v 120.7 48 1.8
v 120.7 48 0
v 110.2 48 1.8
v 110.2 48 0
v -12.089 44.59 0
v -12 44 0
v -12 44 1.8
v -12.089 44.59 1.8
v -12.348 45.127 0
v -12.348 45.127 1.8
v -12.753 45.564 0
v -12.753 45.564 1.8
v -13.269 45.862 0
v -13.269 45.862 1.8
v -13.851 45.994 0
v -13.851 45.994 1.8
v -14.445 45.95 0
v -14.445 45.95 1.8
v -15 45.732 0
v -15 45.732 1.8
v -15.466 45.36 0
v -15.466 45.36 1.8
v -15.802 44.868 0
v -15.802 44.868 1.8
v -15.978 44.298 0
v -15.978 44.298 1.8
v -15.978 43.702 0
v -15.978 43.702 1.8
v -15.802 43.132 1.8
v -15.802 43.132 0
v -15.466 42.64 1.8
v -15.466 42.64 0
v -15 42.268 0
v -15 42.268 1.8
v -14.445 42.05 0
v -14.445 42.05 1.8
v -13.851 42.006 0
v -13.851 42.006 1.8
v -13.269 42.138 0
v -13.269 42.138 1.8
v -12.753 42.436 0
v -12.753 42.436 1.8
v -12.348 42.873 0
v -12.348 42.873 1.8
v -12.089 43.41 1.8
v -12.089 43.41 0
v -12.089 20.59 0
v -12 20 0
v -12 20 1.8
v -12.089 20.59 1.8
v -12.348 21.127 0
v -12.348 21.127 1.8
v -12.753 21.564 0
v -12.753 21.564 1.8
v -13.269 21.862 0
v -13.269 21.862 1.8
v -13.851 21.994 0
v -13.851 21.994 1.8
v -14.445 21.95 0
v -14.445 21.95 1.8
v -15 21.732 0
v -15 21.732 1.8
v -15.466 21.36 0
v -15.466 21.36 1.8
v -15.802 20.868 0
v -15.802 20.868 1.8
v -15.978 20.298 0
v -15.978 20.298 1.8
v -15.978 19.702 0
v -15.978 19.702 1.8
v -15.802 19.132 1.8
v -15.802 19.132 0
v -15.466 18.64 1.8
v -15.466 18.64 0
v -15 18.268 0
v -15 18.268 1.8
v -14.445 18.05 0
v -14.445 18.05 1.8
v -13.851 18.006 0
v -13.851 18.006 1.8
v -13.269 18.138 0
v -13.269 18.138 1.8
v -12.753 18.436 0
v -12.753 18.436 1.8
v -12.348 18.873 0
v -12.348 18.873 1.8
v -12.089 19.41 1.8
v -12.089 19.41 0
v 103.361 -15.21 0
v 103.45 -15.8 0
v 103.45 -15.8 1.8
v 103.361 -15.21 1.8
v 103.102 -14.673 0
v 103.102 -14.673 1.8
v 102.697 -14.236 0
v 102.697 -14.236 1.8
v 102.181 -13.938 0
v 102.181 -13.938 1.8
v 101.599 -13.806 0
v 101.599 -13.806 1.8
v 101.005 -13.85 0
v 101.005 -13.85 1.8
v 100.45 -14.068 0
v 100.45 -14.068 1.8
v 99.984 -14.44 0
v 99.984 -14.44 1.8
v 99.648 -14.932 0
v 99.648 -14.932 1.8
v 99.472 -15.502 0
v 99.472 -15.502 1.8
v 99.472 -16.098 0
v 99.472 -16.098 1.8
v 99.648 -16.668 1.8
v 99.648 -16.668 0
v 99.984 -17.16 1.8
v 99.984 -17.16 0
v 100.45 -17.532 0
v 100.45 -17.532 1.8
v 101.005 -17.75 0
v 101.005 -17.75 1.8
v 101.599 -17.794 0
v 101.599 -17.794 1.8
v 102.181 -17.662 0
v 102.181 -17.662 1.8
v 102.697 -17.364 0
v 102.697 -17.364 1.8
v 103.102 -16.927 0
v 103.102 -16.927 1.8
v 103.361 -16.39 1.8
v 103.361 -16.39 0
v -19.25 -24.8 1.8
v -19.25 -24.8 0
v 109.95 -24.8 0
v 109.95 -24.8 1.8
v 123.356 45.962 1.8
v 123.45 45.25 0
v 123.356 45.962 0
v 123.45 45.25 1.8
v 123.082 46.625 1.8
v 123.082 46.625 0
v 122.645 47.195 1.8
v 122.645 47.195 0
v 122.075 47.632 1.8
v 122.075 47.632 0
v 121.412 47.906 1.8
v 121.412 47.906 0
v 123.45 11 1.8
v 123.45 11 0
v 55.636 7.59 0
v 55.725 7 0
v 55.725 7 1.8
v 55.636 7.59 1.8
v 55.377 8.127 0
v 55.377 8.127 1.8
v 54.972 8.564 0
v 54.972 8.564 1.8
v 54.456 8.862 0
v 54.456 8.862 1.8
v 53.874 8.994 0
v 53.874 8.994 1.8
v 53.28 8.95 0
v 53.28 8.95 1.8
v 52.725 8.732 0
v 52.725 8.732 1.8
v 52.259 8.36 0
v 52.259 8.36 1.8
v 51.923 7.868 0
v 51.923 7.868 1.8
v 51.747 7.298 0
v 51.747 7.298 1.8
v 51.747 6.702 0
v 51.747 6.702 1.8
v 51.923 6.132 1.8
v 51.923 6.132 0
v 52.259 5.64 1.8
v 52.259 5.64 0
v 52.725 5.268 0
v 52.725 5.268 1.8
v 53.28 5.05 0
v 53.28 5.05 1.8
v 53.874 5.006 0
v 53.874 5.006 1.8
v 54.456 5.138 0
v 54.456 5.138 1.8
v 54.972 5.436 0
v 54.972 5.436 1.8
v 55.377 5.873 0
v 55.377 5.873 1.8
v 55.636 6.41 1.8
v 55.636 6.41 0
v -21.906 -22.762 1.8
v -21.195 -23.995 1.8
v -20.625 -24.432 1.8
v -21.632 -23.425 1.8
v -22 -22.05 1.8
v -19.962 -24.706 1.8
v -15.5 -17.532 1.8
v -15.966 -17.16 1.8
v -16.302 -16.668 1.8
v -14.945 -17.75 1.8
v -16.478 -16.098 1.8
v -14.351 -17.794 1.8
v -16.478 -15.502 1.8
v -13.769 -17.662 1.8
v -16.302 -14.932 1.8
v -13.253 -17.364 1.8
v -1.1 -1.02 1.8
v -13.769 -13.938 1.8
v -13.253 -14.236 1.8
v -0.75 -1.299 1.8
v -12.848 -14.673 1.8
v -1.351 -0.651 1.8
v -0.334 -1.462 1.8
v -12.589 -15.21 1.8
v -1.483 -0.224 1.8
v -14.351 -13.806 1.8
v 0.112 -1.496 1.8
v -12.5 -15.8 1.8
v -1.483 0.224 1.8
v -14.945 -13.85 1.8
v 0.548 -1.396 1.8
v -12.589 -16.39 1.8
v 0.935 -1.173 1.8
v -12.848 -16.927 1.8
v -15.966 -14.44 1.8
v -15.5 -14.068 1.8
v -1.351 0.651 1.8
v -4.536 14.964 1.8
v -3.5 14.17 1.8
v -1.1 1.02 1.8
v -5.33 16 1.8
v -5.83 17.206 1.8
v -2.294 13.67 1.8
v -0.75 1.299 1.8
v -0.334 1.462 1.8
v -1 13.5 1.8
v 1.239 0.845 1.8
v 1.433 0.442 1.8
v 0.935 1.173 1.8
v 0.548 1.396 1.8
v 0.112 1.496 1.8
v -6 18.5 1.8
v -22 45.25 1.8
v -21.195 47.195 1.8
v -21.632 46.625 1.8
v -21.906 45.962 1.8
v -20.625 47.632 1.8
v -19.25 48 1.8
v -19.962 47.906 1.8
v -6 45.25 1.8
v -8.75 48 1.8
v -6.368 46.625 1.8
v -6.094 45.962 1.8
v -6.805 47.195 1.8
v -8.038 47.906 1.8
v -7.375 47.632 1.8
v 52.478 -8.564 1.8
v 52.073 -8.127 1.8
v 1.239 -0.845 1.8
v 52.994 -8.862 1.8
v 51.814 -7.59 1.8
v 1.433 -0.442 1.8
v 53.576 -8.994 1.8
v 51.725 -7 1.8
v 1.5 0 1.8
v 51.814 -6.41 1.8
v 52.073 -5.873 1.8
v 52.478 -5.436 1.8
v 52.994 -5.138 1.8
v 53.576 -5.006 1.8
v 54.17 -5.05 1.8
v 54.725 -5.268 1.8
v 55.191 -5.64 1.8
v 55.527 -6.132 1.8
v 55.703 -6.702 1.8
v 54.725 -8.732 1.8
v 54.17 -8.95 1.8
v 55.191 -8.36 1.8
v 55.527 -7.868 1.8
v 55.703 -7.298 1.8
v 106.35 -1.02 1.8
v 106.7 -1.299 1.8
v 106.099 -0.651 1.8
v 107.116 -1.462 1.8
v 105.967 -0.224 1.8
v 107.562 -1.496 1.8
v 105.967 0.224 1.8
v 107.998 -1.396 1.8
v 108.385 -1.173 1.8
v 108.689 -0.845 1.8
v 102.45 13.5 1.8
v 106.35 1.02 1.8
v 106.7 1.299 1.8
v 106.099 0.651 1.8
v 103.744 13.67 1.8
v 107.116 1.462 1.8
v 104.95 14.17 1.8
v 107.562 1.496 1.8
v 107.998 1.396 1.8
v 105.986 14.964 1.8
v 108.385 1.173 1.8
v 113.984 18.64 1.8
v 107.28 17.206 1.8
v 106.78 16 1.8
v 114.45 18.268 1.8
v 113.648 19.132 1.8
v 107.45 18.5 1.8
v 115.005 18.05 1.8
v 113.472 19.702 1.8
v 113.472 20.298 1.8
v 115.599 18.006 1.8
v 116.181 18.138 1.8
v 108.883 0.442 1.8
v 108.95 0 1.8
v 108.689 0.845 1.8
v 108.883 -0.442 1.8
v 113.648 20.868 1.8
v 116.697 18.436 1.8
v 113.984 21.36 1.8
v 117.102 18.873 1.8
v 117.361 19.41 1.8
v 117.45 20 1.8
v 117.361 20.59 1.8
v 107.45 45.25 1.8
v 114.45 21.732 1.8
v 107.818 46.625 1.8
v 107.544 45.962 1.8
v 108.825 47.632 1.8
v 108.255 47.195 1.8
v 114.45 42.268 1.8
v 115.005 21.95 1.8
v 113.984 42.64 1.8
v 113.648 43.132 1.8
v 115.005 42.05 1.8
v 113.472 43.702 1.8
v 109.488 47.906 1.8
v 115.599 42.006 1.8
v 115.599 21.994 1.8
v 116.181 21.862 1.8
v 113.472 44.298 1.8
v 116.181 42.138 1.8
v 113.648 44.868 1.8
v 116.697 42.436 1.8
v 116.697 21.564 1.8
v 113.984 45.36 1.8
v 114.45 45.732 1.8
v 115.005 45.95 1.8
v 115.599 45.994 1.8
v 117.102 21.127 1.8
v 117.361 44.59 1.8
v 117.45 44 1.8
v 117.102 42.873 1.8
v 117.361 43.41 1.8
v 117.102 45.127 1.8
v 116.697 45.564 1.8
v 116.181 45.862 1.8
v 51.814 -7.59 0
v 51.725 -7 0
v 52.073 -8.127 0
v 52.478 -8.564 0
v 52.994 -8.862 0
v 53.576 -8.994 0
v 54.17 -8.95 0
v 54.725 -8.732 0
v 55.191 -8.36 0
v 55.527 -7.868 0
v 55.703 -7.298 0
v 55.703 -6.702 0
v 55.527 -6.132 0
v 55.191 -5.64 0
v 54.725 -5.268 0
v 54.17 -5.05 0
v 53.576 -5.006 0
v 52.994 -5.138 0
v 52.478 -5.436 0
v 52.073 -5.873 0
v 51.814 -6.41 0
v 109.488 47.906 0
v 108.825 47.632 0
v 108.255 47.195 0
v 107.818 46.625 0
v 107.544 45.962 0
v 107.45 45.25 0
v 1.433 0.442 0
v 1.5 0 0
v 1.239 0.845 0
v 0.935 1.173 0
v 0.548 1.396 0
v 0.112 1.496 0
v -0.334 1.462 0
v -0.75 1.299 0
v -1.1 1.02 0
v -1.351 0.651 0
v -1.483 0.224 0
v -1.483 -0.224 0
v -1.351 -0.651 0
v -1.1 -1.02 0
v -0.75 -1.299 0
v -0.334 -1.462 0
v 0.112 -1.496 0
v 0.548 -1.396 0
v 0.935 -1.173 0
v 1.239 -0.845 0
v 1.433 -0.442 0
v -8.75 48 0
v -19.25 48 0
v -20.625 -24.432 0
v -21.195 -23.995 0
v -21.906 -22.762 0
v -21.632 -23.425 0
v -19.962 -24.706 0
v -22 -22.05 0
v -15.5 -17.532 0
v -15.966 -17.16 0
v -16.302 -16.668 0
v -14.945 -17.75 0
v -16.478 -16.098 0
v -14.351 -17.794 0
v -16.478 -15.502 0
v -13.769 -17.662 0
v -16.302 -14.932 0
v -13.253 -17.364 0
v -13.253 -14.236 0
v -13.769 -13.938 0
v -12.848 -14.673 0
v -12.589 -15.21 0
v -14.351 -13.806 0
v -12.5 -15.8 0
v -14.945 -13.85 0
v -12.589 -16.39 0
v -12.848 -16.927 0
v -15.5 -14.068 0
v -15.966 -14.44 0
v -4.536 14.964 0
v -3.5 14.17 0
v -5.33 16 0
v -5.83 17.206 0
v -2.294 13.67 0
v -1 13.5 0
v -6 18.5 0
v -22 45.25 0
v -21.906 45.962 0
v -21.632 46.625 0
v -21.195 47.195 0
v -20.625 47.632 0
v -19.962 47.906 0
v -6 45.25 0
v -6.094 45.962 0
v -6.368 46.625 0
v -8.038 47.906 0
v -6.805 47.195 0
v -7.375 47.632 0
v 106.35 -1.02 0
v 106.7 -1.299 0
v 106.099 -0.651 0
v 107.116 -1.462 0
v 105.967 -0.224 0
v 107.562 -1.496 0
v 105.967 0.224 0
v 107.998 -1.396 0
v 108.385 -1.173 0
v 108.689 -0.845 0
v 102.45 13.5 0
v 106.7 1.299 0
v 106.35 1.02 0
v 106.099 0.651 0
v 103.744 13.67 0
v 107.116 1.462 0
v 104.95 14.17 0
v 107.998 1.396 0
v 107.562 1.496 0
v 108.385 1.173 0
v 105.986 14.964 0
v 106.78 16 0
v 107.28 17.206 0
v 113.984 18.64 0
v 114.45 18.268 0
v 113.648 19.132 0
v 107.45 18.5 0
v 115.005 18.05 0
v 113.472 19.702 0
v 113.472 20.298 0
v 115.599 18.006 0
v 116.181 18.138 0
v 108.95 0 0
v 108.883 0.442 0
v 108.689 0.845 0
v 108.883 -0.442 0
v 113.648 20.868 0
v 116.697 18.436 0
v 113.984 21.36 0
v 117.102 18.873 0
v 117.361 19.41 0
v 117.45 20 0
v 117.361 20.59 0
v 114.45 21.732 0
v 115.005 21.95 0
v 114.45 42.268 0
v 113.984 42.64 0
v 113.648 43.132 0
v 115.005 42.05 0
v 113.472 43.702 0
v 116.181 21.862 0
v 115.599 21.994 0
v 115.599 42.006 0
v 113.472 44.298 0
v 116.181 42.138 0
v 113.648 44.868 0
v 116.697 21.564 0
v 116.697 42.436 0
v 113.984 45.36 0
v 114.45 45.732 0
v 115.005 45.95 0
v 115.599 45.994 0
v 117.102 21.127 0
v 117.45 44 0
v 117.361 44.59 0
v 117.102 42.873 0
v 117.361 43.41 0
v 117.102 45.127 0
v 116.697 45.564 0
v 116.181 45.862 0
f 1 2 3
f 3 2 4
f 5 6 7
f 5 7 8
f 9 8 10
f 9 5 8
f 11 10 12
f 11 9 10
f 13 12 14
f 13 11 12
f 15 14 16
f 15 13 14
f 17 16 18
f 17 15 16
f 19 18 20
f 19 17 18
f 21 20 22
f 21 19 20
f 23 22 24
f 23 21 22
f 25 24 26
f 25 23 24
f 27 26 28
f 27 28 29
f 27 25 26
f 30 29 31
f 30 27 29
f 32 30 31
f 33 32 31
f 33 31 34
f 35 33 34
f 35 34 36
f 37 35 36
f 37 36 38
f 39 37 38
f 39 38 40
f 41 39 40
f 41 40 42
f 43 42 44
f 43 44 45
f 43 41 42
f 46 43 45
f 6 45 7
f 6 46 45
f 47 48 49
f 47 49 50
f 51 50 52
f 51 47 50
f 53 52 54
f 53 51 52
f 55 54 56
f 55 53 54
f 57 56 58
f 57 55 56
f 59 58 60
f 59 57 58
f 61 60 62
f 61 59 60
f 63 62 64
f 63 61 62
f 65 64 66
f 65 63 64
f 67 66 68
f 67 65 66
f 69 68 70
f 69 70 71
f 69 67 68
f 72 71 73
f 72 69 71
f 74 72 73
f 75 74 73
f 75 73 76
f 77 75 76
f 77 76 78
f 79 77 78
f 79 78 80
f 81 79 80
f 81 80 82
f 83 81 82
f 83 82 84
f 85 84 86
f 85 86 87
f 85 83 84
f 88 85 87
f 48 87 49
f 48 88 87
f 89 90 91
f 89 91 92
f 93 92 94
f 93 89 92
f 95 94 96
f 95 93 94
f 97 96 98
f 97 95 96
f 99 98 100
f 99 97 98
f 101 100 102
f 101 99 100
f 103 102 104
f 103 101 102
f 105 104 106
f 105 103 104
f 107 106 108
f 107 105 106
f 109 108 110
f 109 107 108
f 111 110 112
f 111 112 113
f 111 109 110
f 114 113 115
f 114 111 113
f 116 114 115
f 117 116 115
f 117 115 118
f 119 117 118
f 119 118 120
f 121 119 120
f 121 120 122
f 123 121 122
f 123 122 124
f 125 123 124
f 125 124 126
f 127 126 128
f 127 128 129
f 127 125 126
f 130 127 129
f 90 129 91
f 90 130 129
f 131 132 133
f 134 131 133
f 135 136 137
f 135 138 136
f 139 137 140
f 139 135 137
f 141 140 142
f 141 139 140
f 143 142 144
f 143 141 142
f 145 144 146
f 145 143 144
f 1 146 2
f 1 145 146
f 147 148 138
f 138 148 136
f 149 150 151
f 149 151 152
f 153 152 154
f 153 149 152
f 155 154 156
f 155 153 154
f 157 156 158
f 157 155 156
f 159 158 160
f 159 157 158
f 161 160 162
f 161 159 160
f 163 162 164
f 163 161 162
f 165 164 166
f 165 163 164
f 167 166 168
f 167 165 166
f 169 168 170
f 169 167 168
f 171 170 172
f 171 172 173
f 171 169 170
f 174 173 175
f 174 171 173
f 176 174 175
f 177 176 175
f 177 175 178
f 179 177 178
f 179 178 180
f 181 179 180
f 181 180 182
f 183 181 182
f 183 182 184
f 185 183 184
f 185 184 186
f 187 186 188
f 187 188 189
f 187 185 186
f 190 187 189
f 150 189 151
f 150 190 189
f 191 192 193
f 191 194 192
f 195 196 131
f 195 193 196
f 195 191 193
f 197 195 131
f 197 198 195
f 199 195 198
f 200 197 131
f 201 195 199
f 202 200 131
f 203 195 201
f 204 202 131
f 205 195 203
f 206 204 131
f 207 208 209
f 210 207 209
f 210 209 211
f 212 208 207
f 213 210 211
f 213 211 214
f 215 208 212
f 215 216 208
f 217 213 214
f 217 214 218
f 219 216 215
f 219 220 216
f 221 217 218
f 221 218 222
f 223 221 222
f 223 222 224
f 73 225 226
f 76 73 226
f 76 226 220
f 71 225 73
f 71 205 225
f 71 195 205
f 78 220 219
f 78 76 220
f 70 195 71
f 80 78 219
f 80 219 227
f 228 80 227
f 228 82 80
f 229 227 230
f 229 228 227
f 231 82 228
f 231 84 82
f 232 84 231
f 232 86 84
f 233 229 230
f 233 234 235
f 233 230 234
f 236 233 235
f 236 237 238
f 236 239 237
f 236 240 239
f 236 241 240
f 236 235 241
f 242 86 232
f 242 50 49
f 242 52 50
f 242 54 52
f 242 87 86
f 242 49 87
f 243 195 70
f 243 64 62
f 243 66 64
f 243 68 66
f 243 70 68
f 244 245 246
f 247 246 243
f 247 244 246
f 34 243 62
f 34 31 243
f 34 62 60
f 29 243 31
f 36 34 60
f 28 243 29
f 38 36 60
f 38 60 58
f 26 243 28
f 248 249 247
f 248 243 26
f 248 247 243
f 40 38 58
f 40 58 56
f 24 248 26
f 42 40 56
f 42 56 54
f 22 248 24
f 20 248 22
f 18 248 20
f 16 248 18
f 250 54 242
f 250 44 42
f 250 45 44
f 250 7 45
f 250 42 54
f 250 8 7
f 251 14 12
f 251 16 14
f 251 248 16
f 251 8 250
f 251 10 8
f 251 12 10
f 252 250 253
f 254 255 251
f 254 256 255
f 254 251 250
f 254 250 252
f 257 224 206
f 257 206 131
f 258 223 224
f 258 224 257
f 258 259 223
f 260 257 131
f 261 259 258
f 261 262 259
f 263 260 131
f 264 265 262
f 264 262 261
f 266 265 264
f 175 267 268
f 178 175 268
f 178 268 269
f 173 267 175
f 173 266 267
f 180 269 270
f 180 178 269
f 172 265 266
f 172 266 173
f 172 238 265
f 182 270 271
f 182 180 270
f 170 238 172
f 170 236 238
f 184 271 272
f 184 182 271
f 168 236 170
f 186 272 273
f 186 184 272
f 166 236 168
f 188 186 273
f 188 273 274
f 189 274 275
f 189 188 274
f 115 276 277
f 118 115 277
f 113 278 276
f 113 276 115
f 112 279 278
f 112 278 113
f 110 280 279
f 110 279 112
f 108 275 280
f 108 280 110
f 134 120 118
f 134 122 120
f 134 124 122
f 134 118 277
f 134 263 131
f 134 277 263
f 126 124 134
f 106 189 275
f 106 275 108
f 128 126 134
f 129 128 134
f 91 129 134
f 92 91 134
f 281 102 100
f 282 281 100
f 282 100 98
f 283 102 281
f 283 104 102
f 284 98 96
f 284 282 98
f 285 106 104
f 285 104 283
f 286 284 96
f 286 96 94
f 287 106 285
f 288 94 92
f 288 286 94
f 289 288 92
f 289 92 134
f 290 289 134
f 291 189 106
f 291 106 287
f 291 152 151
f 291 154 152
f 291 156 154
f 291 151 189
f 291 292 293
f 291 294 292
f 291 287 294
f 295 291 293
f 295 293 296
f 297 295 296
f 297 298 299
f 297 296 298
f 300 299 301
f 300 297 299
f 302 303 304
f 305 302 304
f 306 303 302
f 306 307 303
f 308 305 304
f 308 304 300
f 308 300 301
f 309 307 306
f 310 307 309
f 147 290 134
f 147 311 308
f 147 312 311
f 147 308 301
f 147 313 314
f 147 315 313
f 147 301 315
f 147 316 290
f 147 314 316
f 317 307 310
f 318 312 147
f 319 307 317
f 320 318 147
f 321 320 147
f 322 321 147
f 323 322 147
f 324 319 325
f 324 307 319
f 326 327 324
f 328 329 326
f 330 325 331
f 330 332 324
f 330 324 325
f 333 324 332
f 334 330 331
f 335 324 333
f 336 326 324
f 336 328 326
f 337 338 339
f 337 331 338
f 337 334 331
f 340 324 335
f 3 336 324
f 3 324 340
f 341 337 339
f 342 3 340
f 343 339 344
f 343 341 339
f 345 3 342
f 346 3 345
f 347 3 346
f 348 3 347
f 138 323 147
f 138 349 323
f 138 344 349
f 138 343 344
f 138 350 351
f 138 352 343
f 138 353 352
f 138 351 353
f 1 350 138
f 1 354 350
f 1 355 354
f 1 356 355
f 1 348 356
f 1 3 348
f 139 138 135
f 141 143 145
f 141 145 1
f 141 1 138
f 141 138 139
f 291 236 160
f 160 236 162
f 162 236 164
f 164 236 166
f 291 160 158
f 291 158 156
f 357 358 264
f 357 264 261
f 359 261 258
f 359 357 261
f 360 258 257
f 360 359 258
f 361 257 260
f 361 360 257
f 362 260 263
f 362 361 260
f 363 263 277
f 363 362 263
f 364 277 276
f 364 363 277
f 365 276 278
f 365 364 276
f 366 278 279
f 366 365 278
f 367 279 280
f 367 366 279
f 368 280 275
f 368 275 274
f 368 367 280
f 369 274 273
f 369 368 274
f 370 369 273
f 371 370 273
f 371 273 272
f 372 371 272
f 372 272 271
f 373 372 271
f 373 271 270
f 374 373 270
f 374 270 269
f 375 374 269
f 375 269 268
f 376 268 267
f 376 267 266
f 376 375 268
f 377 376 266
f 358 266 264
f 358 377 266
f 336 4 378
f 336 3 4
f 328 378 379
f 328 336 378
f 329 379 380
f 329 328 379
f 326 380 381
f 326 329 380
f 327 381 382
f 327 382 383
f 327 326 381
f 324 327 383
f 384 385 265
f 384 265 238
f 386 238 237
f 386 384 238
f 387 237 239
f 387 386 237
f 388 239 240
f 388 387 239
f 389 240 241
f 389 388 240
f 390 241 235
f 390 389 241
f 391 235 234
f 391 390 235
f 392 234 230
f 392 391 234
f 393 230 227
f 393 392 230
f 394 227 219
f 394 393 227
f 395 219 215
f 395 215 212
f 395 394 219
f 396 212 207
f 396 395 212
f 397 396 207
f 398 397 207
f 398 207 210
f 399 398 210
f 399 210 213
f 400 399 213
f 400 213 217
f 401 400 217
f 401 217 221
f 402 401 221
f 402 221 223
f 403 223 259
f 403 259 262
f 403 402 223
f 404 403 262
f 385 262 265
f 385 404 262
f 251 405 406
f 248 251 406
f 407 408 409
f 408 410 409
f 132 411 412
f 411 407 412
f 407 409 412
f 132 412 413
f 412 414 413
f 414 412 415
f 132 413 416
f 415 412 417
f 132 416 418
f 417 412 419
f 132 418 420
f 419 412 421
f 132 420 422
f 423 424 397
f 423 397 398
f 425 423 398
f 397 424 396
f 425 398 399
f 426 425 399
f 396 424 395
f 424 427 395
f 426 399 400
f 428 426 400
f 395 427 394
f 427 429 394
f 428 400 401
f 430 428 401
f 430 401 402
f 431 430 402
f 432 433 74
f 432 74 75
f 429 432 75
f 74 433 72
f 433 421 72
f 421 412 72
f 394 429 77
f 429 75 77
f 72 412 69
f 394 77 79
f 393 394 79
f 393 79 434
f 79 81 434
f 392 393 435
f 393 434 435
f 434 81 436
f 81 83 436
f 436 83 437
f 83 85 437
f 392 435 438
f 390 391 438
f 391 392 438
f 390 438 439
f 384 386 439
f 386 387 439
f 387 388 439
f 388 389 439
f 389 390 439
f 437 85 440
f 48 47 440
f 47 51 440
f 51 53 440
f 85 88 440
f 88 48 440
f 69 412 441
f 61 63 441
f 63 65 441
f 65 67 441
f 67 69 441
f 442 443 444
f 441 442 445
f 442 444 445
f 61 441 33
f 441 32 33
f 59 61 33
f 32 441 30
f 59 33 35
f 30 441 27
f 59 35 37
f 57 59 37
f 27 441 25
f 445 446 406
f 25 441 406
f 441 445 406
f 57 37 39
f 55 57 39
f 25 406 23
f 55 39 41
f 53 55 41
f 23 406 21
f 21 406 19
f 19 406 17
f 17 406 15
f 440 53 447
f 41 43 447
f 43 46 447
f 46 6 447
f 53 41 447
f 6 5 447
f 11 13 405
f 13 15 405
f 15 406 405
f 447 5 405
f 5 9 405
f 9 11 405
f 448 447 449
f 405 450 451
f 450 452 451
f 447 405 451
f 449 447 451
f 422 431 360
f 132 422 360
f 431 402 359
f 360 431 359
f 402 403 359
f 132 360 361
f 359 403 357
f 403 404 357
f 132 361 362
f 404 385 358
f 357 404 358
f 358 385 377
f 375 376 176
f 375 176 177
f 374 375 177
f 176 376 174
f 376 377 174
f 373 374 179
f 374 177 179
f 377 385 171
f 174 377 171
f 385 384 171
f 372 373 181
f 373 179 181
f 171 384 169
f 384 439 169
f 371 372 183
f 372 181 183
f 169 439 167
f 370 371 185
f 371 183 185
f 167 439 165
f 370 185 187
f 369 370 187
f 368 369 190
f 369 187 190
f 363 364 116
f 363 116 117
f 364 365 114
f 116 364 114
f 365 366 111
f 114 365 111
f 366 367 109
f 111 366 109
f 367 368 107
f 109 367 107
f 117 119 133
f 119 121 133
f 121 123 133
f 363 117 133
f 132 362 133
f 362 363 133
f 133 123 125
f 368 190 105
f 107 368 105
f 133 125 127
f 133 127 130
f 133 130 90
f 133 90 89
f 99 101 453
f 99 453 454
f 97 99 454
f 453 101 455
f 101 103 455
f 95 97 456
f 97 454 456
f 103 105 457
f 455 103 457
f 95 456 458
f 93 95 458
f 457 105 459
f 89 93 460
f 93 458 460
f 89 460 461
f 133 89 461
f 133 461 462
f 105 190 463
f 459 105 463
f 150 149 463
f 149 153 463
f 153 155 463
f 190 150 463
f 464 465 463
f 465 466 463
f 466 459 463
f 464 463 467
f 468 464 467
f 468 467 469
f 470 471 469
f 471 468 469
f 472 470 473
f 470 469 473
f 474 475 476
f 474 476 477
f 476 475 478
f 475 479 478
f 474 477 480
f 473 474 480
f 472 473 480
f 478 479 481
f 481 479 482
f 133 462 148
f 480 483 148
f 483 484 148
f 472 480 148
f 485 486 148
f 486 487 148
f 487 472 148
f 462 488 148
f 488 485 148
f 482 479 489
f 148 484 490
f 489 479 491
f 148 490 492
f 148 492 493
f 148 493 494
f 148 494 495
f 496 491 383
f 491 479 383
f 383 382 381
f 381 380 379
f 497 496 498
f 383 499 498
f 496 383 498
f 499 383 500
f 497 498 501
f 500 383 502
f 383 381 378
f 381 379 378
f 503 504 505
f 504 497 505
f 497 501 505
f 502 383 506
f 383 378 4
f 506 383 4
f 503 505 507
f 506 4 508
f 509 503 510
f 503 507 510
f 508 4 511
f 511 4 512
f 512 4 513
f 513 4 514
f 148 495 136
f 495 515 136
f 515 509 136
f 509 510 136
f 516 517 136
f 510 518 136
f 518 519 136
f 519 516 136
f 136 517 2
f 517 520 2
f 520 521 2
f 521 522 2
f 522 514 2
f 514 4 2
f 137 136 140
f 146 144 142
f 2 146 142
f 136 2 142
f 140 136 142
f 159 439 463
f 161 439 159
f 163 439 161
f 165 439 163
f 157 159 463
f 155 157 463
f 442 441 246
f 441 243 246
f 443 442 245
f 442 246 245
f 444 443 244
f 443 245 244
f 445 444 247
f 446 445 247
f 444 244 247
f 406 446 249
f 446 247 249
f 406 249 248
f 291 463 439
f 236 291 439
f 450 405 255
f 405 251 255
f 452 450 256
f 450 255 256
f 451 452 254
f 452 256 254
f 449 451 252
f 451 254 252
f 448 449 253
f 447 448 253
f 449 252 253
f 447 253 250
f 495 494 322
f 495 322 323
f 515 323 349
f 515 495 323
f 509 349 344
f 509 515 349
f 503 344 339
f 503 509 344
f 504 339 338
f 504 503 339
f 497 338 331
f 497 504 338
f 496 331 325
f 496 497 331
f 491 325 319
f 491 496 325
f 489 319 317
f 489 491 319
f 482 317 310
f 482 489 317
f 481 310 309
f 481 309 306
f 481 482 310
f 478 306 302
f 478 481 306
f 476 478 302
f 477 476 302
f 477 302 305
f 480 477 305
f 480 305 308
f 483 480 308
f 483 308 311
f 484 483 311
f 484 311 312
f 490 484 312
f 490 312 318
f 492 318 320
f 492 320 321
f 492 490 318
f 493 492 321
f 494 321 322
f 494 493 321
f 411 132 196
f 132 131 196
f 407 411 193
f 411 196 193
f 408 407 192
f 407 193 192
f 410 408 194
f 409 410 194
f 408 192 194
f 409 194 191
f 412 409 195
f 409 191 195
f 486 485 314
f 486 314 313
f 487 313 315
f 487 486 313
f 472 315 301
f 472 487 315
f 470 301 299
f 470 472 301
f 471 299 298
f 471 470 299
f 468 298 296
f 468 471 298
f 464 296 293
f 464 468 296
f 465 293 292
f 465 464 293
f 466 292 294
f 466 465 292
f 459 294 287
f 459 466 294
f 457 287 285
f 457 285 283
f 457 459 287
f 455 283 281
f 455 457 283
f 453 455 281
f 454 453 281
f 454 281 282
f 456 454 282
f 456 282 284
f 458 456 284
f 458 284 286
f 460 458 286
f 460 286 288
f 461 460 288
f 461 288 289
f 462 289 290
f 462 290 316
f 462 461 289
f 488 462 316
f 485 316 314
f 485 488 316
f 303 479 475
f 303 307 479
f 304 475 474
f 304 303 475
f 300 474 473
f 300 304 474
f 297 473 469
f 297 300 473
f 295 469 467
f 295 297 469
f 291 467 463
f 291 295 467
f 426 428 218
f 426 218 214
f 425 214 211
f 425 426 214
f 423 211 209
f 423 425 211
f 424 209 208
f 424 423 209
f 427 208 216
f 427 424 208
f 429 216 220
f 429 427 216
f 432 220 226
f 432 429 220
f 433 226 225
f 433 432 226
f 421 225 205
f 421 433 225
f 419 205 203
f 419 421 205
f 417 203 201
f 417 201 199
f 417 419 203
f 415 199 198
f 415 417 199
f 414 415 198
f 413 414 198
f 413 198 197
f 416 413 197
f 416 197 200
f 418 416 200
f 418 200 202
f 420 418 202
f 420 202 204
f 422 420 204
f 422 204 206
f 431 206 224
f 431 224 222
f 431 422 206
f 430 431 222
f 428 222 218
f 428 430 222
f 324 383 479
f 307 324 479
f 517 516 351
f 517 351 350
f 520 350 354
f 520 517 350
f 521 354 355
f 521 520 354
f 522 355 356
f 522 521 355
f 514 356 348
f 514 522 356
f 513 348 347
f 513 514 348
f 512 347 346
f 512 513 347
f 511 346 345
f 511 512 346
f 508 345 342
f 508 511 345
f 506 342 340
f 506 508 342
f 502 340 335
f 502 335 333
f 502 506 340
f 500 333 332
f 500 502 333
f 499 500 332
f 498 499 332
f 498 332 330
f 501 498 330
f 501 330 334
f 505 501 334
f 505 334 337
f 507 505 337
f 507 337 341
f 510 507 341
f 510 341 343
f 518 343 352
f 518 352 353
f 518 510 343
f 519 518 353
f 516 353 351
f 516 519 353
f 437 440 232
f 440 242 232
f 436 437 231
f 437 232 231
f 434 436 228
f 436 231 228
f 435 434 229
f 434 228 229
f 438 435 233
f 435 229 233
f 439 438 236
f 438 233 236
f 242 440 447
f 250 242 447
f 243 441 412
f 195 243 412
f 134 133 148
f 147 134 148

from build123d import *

# Parameters (mm, degrees)
SKETCH_1_R      = 1.5
SKETCH_1_R_2    = 2
EXTRUDE_1_DEPTH = 1.8
FILLET_1_R      = 2.75
FILLET_2_R      = 5


with BuildPart() as part:
    # 草图1 → 凸台-拉伸1 (new body)
    with BuildSketch(Plane.XY):
        Polygon((-22, -24.8), (109.95, -24.8), (123.45, 11), (123.45, 48), (107.45, 48), (107.45, 13.5), (-6, 13.5), (-6, 48), (-22, 48), align=None)
        Circle(SKETCH_1_R, mode=Mode.SUBTRACT)
        with Locations((107.45, 0)):
            Circle(SKETCH_1_R, mode=Mode.SUBTRACT)
        with Locations((115.45, 20)):
            Circle(SKETCH_1_R_2, mode=Mode.SUBTRACT)
        with Locations((-14, 20)):
            Circle(SKETCH_1_R_2, mode=Mode.SUBTRACT)
        with Locations((-14.5, -15.8)):
            Circle(SKETCH_1_R_2, mode=Mode.SUBTRACT)
        with Locations((101.45, -15.8)):
            Circle(SKETCH_1_R_2, mode=Mode.SUBTRACT)
        with Locations((115.45, 44)):
            Circle(SKETCH_1_R_2, mode=Mode.SUBTRACT)
        with Locations((-14, 44)):
            Circle(SKETCH_1_R_2, mode=Mode.SUBTRACT)
        with Locations((53.725, 7)):
            Circle(SKETCH_1_R_2, mode=Mode.SUBTRACT)
        with Locations(Location((53.725, -7, 0), (0, 0, 180))):
            Circle(SKETCH_1_R_2, mode=Mode.SUBTRACT)
    extrude(amount=EXTRUDE_1_DEPTH)

    # 圆角1
    fillet_1_edges = [part.edges().sort_by_distance(p)[0] for p in [
        (-22, 48, 0.9),
        (-6, 48, 0.9),
        (107.45, 48, 0.9),
        (123.45, 48, 0.9),
        (-22, -24.8, 0.9),
    ]]
    fillet(fillet_1_edges, radius=FILLET_1_R)

    # 圆角2
    fillet_2_edges = [part.edges().sort_by_distance(p)[0] for p in [
        (-6, 13.5, 0.9),
        (107.45, 13.5, 0.9),
    ]]
    fillet(fillet_2_edges, radius=FILLET_2_R)


solid = part.part
